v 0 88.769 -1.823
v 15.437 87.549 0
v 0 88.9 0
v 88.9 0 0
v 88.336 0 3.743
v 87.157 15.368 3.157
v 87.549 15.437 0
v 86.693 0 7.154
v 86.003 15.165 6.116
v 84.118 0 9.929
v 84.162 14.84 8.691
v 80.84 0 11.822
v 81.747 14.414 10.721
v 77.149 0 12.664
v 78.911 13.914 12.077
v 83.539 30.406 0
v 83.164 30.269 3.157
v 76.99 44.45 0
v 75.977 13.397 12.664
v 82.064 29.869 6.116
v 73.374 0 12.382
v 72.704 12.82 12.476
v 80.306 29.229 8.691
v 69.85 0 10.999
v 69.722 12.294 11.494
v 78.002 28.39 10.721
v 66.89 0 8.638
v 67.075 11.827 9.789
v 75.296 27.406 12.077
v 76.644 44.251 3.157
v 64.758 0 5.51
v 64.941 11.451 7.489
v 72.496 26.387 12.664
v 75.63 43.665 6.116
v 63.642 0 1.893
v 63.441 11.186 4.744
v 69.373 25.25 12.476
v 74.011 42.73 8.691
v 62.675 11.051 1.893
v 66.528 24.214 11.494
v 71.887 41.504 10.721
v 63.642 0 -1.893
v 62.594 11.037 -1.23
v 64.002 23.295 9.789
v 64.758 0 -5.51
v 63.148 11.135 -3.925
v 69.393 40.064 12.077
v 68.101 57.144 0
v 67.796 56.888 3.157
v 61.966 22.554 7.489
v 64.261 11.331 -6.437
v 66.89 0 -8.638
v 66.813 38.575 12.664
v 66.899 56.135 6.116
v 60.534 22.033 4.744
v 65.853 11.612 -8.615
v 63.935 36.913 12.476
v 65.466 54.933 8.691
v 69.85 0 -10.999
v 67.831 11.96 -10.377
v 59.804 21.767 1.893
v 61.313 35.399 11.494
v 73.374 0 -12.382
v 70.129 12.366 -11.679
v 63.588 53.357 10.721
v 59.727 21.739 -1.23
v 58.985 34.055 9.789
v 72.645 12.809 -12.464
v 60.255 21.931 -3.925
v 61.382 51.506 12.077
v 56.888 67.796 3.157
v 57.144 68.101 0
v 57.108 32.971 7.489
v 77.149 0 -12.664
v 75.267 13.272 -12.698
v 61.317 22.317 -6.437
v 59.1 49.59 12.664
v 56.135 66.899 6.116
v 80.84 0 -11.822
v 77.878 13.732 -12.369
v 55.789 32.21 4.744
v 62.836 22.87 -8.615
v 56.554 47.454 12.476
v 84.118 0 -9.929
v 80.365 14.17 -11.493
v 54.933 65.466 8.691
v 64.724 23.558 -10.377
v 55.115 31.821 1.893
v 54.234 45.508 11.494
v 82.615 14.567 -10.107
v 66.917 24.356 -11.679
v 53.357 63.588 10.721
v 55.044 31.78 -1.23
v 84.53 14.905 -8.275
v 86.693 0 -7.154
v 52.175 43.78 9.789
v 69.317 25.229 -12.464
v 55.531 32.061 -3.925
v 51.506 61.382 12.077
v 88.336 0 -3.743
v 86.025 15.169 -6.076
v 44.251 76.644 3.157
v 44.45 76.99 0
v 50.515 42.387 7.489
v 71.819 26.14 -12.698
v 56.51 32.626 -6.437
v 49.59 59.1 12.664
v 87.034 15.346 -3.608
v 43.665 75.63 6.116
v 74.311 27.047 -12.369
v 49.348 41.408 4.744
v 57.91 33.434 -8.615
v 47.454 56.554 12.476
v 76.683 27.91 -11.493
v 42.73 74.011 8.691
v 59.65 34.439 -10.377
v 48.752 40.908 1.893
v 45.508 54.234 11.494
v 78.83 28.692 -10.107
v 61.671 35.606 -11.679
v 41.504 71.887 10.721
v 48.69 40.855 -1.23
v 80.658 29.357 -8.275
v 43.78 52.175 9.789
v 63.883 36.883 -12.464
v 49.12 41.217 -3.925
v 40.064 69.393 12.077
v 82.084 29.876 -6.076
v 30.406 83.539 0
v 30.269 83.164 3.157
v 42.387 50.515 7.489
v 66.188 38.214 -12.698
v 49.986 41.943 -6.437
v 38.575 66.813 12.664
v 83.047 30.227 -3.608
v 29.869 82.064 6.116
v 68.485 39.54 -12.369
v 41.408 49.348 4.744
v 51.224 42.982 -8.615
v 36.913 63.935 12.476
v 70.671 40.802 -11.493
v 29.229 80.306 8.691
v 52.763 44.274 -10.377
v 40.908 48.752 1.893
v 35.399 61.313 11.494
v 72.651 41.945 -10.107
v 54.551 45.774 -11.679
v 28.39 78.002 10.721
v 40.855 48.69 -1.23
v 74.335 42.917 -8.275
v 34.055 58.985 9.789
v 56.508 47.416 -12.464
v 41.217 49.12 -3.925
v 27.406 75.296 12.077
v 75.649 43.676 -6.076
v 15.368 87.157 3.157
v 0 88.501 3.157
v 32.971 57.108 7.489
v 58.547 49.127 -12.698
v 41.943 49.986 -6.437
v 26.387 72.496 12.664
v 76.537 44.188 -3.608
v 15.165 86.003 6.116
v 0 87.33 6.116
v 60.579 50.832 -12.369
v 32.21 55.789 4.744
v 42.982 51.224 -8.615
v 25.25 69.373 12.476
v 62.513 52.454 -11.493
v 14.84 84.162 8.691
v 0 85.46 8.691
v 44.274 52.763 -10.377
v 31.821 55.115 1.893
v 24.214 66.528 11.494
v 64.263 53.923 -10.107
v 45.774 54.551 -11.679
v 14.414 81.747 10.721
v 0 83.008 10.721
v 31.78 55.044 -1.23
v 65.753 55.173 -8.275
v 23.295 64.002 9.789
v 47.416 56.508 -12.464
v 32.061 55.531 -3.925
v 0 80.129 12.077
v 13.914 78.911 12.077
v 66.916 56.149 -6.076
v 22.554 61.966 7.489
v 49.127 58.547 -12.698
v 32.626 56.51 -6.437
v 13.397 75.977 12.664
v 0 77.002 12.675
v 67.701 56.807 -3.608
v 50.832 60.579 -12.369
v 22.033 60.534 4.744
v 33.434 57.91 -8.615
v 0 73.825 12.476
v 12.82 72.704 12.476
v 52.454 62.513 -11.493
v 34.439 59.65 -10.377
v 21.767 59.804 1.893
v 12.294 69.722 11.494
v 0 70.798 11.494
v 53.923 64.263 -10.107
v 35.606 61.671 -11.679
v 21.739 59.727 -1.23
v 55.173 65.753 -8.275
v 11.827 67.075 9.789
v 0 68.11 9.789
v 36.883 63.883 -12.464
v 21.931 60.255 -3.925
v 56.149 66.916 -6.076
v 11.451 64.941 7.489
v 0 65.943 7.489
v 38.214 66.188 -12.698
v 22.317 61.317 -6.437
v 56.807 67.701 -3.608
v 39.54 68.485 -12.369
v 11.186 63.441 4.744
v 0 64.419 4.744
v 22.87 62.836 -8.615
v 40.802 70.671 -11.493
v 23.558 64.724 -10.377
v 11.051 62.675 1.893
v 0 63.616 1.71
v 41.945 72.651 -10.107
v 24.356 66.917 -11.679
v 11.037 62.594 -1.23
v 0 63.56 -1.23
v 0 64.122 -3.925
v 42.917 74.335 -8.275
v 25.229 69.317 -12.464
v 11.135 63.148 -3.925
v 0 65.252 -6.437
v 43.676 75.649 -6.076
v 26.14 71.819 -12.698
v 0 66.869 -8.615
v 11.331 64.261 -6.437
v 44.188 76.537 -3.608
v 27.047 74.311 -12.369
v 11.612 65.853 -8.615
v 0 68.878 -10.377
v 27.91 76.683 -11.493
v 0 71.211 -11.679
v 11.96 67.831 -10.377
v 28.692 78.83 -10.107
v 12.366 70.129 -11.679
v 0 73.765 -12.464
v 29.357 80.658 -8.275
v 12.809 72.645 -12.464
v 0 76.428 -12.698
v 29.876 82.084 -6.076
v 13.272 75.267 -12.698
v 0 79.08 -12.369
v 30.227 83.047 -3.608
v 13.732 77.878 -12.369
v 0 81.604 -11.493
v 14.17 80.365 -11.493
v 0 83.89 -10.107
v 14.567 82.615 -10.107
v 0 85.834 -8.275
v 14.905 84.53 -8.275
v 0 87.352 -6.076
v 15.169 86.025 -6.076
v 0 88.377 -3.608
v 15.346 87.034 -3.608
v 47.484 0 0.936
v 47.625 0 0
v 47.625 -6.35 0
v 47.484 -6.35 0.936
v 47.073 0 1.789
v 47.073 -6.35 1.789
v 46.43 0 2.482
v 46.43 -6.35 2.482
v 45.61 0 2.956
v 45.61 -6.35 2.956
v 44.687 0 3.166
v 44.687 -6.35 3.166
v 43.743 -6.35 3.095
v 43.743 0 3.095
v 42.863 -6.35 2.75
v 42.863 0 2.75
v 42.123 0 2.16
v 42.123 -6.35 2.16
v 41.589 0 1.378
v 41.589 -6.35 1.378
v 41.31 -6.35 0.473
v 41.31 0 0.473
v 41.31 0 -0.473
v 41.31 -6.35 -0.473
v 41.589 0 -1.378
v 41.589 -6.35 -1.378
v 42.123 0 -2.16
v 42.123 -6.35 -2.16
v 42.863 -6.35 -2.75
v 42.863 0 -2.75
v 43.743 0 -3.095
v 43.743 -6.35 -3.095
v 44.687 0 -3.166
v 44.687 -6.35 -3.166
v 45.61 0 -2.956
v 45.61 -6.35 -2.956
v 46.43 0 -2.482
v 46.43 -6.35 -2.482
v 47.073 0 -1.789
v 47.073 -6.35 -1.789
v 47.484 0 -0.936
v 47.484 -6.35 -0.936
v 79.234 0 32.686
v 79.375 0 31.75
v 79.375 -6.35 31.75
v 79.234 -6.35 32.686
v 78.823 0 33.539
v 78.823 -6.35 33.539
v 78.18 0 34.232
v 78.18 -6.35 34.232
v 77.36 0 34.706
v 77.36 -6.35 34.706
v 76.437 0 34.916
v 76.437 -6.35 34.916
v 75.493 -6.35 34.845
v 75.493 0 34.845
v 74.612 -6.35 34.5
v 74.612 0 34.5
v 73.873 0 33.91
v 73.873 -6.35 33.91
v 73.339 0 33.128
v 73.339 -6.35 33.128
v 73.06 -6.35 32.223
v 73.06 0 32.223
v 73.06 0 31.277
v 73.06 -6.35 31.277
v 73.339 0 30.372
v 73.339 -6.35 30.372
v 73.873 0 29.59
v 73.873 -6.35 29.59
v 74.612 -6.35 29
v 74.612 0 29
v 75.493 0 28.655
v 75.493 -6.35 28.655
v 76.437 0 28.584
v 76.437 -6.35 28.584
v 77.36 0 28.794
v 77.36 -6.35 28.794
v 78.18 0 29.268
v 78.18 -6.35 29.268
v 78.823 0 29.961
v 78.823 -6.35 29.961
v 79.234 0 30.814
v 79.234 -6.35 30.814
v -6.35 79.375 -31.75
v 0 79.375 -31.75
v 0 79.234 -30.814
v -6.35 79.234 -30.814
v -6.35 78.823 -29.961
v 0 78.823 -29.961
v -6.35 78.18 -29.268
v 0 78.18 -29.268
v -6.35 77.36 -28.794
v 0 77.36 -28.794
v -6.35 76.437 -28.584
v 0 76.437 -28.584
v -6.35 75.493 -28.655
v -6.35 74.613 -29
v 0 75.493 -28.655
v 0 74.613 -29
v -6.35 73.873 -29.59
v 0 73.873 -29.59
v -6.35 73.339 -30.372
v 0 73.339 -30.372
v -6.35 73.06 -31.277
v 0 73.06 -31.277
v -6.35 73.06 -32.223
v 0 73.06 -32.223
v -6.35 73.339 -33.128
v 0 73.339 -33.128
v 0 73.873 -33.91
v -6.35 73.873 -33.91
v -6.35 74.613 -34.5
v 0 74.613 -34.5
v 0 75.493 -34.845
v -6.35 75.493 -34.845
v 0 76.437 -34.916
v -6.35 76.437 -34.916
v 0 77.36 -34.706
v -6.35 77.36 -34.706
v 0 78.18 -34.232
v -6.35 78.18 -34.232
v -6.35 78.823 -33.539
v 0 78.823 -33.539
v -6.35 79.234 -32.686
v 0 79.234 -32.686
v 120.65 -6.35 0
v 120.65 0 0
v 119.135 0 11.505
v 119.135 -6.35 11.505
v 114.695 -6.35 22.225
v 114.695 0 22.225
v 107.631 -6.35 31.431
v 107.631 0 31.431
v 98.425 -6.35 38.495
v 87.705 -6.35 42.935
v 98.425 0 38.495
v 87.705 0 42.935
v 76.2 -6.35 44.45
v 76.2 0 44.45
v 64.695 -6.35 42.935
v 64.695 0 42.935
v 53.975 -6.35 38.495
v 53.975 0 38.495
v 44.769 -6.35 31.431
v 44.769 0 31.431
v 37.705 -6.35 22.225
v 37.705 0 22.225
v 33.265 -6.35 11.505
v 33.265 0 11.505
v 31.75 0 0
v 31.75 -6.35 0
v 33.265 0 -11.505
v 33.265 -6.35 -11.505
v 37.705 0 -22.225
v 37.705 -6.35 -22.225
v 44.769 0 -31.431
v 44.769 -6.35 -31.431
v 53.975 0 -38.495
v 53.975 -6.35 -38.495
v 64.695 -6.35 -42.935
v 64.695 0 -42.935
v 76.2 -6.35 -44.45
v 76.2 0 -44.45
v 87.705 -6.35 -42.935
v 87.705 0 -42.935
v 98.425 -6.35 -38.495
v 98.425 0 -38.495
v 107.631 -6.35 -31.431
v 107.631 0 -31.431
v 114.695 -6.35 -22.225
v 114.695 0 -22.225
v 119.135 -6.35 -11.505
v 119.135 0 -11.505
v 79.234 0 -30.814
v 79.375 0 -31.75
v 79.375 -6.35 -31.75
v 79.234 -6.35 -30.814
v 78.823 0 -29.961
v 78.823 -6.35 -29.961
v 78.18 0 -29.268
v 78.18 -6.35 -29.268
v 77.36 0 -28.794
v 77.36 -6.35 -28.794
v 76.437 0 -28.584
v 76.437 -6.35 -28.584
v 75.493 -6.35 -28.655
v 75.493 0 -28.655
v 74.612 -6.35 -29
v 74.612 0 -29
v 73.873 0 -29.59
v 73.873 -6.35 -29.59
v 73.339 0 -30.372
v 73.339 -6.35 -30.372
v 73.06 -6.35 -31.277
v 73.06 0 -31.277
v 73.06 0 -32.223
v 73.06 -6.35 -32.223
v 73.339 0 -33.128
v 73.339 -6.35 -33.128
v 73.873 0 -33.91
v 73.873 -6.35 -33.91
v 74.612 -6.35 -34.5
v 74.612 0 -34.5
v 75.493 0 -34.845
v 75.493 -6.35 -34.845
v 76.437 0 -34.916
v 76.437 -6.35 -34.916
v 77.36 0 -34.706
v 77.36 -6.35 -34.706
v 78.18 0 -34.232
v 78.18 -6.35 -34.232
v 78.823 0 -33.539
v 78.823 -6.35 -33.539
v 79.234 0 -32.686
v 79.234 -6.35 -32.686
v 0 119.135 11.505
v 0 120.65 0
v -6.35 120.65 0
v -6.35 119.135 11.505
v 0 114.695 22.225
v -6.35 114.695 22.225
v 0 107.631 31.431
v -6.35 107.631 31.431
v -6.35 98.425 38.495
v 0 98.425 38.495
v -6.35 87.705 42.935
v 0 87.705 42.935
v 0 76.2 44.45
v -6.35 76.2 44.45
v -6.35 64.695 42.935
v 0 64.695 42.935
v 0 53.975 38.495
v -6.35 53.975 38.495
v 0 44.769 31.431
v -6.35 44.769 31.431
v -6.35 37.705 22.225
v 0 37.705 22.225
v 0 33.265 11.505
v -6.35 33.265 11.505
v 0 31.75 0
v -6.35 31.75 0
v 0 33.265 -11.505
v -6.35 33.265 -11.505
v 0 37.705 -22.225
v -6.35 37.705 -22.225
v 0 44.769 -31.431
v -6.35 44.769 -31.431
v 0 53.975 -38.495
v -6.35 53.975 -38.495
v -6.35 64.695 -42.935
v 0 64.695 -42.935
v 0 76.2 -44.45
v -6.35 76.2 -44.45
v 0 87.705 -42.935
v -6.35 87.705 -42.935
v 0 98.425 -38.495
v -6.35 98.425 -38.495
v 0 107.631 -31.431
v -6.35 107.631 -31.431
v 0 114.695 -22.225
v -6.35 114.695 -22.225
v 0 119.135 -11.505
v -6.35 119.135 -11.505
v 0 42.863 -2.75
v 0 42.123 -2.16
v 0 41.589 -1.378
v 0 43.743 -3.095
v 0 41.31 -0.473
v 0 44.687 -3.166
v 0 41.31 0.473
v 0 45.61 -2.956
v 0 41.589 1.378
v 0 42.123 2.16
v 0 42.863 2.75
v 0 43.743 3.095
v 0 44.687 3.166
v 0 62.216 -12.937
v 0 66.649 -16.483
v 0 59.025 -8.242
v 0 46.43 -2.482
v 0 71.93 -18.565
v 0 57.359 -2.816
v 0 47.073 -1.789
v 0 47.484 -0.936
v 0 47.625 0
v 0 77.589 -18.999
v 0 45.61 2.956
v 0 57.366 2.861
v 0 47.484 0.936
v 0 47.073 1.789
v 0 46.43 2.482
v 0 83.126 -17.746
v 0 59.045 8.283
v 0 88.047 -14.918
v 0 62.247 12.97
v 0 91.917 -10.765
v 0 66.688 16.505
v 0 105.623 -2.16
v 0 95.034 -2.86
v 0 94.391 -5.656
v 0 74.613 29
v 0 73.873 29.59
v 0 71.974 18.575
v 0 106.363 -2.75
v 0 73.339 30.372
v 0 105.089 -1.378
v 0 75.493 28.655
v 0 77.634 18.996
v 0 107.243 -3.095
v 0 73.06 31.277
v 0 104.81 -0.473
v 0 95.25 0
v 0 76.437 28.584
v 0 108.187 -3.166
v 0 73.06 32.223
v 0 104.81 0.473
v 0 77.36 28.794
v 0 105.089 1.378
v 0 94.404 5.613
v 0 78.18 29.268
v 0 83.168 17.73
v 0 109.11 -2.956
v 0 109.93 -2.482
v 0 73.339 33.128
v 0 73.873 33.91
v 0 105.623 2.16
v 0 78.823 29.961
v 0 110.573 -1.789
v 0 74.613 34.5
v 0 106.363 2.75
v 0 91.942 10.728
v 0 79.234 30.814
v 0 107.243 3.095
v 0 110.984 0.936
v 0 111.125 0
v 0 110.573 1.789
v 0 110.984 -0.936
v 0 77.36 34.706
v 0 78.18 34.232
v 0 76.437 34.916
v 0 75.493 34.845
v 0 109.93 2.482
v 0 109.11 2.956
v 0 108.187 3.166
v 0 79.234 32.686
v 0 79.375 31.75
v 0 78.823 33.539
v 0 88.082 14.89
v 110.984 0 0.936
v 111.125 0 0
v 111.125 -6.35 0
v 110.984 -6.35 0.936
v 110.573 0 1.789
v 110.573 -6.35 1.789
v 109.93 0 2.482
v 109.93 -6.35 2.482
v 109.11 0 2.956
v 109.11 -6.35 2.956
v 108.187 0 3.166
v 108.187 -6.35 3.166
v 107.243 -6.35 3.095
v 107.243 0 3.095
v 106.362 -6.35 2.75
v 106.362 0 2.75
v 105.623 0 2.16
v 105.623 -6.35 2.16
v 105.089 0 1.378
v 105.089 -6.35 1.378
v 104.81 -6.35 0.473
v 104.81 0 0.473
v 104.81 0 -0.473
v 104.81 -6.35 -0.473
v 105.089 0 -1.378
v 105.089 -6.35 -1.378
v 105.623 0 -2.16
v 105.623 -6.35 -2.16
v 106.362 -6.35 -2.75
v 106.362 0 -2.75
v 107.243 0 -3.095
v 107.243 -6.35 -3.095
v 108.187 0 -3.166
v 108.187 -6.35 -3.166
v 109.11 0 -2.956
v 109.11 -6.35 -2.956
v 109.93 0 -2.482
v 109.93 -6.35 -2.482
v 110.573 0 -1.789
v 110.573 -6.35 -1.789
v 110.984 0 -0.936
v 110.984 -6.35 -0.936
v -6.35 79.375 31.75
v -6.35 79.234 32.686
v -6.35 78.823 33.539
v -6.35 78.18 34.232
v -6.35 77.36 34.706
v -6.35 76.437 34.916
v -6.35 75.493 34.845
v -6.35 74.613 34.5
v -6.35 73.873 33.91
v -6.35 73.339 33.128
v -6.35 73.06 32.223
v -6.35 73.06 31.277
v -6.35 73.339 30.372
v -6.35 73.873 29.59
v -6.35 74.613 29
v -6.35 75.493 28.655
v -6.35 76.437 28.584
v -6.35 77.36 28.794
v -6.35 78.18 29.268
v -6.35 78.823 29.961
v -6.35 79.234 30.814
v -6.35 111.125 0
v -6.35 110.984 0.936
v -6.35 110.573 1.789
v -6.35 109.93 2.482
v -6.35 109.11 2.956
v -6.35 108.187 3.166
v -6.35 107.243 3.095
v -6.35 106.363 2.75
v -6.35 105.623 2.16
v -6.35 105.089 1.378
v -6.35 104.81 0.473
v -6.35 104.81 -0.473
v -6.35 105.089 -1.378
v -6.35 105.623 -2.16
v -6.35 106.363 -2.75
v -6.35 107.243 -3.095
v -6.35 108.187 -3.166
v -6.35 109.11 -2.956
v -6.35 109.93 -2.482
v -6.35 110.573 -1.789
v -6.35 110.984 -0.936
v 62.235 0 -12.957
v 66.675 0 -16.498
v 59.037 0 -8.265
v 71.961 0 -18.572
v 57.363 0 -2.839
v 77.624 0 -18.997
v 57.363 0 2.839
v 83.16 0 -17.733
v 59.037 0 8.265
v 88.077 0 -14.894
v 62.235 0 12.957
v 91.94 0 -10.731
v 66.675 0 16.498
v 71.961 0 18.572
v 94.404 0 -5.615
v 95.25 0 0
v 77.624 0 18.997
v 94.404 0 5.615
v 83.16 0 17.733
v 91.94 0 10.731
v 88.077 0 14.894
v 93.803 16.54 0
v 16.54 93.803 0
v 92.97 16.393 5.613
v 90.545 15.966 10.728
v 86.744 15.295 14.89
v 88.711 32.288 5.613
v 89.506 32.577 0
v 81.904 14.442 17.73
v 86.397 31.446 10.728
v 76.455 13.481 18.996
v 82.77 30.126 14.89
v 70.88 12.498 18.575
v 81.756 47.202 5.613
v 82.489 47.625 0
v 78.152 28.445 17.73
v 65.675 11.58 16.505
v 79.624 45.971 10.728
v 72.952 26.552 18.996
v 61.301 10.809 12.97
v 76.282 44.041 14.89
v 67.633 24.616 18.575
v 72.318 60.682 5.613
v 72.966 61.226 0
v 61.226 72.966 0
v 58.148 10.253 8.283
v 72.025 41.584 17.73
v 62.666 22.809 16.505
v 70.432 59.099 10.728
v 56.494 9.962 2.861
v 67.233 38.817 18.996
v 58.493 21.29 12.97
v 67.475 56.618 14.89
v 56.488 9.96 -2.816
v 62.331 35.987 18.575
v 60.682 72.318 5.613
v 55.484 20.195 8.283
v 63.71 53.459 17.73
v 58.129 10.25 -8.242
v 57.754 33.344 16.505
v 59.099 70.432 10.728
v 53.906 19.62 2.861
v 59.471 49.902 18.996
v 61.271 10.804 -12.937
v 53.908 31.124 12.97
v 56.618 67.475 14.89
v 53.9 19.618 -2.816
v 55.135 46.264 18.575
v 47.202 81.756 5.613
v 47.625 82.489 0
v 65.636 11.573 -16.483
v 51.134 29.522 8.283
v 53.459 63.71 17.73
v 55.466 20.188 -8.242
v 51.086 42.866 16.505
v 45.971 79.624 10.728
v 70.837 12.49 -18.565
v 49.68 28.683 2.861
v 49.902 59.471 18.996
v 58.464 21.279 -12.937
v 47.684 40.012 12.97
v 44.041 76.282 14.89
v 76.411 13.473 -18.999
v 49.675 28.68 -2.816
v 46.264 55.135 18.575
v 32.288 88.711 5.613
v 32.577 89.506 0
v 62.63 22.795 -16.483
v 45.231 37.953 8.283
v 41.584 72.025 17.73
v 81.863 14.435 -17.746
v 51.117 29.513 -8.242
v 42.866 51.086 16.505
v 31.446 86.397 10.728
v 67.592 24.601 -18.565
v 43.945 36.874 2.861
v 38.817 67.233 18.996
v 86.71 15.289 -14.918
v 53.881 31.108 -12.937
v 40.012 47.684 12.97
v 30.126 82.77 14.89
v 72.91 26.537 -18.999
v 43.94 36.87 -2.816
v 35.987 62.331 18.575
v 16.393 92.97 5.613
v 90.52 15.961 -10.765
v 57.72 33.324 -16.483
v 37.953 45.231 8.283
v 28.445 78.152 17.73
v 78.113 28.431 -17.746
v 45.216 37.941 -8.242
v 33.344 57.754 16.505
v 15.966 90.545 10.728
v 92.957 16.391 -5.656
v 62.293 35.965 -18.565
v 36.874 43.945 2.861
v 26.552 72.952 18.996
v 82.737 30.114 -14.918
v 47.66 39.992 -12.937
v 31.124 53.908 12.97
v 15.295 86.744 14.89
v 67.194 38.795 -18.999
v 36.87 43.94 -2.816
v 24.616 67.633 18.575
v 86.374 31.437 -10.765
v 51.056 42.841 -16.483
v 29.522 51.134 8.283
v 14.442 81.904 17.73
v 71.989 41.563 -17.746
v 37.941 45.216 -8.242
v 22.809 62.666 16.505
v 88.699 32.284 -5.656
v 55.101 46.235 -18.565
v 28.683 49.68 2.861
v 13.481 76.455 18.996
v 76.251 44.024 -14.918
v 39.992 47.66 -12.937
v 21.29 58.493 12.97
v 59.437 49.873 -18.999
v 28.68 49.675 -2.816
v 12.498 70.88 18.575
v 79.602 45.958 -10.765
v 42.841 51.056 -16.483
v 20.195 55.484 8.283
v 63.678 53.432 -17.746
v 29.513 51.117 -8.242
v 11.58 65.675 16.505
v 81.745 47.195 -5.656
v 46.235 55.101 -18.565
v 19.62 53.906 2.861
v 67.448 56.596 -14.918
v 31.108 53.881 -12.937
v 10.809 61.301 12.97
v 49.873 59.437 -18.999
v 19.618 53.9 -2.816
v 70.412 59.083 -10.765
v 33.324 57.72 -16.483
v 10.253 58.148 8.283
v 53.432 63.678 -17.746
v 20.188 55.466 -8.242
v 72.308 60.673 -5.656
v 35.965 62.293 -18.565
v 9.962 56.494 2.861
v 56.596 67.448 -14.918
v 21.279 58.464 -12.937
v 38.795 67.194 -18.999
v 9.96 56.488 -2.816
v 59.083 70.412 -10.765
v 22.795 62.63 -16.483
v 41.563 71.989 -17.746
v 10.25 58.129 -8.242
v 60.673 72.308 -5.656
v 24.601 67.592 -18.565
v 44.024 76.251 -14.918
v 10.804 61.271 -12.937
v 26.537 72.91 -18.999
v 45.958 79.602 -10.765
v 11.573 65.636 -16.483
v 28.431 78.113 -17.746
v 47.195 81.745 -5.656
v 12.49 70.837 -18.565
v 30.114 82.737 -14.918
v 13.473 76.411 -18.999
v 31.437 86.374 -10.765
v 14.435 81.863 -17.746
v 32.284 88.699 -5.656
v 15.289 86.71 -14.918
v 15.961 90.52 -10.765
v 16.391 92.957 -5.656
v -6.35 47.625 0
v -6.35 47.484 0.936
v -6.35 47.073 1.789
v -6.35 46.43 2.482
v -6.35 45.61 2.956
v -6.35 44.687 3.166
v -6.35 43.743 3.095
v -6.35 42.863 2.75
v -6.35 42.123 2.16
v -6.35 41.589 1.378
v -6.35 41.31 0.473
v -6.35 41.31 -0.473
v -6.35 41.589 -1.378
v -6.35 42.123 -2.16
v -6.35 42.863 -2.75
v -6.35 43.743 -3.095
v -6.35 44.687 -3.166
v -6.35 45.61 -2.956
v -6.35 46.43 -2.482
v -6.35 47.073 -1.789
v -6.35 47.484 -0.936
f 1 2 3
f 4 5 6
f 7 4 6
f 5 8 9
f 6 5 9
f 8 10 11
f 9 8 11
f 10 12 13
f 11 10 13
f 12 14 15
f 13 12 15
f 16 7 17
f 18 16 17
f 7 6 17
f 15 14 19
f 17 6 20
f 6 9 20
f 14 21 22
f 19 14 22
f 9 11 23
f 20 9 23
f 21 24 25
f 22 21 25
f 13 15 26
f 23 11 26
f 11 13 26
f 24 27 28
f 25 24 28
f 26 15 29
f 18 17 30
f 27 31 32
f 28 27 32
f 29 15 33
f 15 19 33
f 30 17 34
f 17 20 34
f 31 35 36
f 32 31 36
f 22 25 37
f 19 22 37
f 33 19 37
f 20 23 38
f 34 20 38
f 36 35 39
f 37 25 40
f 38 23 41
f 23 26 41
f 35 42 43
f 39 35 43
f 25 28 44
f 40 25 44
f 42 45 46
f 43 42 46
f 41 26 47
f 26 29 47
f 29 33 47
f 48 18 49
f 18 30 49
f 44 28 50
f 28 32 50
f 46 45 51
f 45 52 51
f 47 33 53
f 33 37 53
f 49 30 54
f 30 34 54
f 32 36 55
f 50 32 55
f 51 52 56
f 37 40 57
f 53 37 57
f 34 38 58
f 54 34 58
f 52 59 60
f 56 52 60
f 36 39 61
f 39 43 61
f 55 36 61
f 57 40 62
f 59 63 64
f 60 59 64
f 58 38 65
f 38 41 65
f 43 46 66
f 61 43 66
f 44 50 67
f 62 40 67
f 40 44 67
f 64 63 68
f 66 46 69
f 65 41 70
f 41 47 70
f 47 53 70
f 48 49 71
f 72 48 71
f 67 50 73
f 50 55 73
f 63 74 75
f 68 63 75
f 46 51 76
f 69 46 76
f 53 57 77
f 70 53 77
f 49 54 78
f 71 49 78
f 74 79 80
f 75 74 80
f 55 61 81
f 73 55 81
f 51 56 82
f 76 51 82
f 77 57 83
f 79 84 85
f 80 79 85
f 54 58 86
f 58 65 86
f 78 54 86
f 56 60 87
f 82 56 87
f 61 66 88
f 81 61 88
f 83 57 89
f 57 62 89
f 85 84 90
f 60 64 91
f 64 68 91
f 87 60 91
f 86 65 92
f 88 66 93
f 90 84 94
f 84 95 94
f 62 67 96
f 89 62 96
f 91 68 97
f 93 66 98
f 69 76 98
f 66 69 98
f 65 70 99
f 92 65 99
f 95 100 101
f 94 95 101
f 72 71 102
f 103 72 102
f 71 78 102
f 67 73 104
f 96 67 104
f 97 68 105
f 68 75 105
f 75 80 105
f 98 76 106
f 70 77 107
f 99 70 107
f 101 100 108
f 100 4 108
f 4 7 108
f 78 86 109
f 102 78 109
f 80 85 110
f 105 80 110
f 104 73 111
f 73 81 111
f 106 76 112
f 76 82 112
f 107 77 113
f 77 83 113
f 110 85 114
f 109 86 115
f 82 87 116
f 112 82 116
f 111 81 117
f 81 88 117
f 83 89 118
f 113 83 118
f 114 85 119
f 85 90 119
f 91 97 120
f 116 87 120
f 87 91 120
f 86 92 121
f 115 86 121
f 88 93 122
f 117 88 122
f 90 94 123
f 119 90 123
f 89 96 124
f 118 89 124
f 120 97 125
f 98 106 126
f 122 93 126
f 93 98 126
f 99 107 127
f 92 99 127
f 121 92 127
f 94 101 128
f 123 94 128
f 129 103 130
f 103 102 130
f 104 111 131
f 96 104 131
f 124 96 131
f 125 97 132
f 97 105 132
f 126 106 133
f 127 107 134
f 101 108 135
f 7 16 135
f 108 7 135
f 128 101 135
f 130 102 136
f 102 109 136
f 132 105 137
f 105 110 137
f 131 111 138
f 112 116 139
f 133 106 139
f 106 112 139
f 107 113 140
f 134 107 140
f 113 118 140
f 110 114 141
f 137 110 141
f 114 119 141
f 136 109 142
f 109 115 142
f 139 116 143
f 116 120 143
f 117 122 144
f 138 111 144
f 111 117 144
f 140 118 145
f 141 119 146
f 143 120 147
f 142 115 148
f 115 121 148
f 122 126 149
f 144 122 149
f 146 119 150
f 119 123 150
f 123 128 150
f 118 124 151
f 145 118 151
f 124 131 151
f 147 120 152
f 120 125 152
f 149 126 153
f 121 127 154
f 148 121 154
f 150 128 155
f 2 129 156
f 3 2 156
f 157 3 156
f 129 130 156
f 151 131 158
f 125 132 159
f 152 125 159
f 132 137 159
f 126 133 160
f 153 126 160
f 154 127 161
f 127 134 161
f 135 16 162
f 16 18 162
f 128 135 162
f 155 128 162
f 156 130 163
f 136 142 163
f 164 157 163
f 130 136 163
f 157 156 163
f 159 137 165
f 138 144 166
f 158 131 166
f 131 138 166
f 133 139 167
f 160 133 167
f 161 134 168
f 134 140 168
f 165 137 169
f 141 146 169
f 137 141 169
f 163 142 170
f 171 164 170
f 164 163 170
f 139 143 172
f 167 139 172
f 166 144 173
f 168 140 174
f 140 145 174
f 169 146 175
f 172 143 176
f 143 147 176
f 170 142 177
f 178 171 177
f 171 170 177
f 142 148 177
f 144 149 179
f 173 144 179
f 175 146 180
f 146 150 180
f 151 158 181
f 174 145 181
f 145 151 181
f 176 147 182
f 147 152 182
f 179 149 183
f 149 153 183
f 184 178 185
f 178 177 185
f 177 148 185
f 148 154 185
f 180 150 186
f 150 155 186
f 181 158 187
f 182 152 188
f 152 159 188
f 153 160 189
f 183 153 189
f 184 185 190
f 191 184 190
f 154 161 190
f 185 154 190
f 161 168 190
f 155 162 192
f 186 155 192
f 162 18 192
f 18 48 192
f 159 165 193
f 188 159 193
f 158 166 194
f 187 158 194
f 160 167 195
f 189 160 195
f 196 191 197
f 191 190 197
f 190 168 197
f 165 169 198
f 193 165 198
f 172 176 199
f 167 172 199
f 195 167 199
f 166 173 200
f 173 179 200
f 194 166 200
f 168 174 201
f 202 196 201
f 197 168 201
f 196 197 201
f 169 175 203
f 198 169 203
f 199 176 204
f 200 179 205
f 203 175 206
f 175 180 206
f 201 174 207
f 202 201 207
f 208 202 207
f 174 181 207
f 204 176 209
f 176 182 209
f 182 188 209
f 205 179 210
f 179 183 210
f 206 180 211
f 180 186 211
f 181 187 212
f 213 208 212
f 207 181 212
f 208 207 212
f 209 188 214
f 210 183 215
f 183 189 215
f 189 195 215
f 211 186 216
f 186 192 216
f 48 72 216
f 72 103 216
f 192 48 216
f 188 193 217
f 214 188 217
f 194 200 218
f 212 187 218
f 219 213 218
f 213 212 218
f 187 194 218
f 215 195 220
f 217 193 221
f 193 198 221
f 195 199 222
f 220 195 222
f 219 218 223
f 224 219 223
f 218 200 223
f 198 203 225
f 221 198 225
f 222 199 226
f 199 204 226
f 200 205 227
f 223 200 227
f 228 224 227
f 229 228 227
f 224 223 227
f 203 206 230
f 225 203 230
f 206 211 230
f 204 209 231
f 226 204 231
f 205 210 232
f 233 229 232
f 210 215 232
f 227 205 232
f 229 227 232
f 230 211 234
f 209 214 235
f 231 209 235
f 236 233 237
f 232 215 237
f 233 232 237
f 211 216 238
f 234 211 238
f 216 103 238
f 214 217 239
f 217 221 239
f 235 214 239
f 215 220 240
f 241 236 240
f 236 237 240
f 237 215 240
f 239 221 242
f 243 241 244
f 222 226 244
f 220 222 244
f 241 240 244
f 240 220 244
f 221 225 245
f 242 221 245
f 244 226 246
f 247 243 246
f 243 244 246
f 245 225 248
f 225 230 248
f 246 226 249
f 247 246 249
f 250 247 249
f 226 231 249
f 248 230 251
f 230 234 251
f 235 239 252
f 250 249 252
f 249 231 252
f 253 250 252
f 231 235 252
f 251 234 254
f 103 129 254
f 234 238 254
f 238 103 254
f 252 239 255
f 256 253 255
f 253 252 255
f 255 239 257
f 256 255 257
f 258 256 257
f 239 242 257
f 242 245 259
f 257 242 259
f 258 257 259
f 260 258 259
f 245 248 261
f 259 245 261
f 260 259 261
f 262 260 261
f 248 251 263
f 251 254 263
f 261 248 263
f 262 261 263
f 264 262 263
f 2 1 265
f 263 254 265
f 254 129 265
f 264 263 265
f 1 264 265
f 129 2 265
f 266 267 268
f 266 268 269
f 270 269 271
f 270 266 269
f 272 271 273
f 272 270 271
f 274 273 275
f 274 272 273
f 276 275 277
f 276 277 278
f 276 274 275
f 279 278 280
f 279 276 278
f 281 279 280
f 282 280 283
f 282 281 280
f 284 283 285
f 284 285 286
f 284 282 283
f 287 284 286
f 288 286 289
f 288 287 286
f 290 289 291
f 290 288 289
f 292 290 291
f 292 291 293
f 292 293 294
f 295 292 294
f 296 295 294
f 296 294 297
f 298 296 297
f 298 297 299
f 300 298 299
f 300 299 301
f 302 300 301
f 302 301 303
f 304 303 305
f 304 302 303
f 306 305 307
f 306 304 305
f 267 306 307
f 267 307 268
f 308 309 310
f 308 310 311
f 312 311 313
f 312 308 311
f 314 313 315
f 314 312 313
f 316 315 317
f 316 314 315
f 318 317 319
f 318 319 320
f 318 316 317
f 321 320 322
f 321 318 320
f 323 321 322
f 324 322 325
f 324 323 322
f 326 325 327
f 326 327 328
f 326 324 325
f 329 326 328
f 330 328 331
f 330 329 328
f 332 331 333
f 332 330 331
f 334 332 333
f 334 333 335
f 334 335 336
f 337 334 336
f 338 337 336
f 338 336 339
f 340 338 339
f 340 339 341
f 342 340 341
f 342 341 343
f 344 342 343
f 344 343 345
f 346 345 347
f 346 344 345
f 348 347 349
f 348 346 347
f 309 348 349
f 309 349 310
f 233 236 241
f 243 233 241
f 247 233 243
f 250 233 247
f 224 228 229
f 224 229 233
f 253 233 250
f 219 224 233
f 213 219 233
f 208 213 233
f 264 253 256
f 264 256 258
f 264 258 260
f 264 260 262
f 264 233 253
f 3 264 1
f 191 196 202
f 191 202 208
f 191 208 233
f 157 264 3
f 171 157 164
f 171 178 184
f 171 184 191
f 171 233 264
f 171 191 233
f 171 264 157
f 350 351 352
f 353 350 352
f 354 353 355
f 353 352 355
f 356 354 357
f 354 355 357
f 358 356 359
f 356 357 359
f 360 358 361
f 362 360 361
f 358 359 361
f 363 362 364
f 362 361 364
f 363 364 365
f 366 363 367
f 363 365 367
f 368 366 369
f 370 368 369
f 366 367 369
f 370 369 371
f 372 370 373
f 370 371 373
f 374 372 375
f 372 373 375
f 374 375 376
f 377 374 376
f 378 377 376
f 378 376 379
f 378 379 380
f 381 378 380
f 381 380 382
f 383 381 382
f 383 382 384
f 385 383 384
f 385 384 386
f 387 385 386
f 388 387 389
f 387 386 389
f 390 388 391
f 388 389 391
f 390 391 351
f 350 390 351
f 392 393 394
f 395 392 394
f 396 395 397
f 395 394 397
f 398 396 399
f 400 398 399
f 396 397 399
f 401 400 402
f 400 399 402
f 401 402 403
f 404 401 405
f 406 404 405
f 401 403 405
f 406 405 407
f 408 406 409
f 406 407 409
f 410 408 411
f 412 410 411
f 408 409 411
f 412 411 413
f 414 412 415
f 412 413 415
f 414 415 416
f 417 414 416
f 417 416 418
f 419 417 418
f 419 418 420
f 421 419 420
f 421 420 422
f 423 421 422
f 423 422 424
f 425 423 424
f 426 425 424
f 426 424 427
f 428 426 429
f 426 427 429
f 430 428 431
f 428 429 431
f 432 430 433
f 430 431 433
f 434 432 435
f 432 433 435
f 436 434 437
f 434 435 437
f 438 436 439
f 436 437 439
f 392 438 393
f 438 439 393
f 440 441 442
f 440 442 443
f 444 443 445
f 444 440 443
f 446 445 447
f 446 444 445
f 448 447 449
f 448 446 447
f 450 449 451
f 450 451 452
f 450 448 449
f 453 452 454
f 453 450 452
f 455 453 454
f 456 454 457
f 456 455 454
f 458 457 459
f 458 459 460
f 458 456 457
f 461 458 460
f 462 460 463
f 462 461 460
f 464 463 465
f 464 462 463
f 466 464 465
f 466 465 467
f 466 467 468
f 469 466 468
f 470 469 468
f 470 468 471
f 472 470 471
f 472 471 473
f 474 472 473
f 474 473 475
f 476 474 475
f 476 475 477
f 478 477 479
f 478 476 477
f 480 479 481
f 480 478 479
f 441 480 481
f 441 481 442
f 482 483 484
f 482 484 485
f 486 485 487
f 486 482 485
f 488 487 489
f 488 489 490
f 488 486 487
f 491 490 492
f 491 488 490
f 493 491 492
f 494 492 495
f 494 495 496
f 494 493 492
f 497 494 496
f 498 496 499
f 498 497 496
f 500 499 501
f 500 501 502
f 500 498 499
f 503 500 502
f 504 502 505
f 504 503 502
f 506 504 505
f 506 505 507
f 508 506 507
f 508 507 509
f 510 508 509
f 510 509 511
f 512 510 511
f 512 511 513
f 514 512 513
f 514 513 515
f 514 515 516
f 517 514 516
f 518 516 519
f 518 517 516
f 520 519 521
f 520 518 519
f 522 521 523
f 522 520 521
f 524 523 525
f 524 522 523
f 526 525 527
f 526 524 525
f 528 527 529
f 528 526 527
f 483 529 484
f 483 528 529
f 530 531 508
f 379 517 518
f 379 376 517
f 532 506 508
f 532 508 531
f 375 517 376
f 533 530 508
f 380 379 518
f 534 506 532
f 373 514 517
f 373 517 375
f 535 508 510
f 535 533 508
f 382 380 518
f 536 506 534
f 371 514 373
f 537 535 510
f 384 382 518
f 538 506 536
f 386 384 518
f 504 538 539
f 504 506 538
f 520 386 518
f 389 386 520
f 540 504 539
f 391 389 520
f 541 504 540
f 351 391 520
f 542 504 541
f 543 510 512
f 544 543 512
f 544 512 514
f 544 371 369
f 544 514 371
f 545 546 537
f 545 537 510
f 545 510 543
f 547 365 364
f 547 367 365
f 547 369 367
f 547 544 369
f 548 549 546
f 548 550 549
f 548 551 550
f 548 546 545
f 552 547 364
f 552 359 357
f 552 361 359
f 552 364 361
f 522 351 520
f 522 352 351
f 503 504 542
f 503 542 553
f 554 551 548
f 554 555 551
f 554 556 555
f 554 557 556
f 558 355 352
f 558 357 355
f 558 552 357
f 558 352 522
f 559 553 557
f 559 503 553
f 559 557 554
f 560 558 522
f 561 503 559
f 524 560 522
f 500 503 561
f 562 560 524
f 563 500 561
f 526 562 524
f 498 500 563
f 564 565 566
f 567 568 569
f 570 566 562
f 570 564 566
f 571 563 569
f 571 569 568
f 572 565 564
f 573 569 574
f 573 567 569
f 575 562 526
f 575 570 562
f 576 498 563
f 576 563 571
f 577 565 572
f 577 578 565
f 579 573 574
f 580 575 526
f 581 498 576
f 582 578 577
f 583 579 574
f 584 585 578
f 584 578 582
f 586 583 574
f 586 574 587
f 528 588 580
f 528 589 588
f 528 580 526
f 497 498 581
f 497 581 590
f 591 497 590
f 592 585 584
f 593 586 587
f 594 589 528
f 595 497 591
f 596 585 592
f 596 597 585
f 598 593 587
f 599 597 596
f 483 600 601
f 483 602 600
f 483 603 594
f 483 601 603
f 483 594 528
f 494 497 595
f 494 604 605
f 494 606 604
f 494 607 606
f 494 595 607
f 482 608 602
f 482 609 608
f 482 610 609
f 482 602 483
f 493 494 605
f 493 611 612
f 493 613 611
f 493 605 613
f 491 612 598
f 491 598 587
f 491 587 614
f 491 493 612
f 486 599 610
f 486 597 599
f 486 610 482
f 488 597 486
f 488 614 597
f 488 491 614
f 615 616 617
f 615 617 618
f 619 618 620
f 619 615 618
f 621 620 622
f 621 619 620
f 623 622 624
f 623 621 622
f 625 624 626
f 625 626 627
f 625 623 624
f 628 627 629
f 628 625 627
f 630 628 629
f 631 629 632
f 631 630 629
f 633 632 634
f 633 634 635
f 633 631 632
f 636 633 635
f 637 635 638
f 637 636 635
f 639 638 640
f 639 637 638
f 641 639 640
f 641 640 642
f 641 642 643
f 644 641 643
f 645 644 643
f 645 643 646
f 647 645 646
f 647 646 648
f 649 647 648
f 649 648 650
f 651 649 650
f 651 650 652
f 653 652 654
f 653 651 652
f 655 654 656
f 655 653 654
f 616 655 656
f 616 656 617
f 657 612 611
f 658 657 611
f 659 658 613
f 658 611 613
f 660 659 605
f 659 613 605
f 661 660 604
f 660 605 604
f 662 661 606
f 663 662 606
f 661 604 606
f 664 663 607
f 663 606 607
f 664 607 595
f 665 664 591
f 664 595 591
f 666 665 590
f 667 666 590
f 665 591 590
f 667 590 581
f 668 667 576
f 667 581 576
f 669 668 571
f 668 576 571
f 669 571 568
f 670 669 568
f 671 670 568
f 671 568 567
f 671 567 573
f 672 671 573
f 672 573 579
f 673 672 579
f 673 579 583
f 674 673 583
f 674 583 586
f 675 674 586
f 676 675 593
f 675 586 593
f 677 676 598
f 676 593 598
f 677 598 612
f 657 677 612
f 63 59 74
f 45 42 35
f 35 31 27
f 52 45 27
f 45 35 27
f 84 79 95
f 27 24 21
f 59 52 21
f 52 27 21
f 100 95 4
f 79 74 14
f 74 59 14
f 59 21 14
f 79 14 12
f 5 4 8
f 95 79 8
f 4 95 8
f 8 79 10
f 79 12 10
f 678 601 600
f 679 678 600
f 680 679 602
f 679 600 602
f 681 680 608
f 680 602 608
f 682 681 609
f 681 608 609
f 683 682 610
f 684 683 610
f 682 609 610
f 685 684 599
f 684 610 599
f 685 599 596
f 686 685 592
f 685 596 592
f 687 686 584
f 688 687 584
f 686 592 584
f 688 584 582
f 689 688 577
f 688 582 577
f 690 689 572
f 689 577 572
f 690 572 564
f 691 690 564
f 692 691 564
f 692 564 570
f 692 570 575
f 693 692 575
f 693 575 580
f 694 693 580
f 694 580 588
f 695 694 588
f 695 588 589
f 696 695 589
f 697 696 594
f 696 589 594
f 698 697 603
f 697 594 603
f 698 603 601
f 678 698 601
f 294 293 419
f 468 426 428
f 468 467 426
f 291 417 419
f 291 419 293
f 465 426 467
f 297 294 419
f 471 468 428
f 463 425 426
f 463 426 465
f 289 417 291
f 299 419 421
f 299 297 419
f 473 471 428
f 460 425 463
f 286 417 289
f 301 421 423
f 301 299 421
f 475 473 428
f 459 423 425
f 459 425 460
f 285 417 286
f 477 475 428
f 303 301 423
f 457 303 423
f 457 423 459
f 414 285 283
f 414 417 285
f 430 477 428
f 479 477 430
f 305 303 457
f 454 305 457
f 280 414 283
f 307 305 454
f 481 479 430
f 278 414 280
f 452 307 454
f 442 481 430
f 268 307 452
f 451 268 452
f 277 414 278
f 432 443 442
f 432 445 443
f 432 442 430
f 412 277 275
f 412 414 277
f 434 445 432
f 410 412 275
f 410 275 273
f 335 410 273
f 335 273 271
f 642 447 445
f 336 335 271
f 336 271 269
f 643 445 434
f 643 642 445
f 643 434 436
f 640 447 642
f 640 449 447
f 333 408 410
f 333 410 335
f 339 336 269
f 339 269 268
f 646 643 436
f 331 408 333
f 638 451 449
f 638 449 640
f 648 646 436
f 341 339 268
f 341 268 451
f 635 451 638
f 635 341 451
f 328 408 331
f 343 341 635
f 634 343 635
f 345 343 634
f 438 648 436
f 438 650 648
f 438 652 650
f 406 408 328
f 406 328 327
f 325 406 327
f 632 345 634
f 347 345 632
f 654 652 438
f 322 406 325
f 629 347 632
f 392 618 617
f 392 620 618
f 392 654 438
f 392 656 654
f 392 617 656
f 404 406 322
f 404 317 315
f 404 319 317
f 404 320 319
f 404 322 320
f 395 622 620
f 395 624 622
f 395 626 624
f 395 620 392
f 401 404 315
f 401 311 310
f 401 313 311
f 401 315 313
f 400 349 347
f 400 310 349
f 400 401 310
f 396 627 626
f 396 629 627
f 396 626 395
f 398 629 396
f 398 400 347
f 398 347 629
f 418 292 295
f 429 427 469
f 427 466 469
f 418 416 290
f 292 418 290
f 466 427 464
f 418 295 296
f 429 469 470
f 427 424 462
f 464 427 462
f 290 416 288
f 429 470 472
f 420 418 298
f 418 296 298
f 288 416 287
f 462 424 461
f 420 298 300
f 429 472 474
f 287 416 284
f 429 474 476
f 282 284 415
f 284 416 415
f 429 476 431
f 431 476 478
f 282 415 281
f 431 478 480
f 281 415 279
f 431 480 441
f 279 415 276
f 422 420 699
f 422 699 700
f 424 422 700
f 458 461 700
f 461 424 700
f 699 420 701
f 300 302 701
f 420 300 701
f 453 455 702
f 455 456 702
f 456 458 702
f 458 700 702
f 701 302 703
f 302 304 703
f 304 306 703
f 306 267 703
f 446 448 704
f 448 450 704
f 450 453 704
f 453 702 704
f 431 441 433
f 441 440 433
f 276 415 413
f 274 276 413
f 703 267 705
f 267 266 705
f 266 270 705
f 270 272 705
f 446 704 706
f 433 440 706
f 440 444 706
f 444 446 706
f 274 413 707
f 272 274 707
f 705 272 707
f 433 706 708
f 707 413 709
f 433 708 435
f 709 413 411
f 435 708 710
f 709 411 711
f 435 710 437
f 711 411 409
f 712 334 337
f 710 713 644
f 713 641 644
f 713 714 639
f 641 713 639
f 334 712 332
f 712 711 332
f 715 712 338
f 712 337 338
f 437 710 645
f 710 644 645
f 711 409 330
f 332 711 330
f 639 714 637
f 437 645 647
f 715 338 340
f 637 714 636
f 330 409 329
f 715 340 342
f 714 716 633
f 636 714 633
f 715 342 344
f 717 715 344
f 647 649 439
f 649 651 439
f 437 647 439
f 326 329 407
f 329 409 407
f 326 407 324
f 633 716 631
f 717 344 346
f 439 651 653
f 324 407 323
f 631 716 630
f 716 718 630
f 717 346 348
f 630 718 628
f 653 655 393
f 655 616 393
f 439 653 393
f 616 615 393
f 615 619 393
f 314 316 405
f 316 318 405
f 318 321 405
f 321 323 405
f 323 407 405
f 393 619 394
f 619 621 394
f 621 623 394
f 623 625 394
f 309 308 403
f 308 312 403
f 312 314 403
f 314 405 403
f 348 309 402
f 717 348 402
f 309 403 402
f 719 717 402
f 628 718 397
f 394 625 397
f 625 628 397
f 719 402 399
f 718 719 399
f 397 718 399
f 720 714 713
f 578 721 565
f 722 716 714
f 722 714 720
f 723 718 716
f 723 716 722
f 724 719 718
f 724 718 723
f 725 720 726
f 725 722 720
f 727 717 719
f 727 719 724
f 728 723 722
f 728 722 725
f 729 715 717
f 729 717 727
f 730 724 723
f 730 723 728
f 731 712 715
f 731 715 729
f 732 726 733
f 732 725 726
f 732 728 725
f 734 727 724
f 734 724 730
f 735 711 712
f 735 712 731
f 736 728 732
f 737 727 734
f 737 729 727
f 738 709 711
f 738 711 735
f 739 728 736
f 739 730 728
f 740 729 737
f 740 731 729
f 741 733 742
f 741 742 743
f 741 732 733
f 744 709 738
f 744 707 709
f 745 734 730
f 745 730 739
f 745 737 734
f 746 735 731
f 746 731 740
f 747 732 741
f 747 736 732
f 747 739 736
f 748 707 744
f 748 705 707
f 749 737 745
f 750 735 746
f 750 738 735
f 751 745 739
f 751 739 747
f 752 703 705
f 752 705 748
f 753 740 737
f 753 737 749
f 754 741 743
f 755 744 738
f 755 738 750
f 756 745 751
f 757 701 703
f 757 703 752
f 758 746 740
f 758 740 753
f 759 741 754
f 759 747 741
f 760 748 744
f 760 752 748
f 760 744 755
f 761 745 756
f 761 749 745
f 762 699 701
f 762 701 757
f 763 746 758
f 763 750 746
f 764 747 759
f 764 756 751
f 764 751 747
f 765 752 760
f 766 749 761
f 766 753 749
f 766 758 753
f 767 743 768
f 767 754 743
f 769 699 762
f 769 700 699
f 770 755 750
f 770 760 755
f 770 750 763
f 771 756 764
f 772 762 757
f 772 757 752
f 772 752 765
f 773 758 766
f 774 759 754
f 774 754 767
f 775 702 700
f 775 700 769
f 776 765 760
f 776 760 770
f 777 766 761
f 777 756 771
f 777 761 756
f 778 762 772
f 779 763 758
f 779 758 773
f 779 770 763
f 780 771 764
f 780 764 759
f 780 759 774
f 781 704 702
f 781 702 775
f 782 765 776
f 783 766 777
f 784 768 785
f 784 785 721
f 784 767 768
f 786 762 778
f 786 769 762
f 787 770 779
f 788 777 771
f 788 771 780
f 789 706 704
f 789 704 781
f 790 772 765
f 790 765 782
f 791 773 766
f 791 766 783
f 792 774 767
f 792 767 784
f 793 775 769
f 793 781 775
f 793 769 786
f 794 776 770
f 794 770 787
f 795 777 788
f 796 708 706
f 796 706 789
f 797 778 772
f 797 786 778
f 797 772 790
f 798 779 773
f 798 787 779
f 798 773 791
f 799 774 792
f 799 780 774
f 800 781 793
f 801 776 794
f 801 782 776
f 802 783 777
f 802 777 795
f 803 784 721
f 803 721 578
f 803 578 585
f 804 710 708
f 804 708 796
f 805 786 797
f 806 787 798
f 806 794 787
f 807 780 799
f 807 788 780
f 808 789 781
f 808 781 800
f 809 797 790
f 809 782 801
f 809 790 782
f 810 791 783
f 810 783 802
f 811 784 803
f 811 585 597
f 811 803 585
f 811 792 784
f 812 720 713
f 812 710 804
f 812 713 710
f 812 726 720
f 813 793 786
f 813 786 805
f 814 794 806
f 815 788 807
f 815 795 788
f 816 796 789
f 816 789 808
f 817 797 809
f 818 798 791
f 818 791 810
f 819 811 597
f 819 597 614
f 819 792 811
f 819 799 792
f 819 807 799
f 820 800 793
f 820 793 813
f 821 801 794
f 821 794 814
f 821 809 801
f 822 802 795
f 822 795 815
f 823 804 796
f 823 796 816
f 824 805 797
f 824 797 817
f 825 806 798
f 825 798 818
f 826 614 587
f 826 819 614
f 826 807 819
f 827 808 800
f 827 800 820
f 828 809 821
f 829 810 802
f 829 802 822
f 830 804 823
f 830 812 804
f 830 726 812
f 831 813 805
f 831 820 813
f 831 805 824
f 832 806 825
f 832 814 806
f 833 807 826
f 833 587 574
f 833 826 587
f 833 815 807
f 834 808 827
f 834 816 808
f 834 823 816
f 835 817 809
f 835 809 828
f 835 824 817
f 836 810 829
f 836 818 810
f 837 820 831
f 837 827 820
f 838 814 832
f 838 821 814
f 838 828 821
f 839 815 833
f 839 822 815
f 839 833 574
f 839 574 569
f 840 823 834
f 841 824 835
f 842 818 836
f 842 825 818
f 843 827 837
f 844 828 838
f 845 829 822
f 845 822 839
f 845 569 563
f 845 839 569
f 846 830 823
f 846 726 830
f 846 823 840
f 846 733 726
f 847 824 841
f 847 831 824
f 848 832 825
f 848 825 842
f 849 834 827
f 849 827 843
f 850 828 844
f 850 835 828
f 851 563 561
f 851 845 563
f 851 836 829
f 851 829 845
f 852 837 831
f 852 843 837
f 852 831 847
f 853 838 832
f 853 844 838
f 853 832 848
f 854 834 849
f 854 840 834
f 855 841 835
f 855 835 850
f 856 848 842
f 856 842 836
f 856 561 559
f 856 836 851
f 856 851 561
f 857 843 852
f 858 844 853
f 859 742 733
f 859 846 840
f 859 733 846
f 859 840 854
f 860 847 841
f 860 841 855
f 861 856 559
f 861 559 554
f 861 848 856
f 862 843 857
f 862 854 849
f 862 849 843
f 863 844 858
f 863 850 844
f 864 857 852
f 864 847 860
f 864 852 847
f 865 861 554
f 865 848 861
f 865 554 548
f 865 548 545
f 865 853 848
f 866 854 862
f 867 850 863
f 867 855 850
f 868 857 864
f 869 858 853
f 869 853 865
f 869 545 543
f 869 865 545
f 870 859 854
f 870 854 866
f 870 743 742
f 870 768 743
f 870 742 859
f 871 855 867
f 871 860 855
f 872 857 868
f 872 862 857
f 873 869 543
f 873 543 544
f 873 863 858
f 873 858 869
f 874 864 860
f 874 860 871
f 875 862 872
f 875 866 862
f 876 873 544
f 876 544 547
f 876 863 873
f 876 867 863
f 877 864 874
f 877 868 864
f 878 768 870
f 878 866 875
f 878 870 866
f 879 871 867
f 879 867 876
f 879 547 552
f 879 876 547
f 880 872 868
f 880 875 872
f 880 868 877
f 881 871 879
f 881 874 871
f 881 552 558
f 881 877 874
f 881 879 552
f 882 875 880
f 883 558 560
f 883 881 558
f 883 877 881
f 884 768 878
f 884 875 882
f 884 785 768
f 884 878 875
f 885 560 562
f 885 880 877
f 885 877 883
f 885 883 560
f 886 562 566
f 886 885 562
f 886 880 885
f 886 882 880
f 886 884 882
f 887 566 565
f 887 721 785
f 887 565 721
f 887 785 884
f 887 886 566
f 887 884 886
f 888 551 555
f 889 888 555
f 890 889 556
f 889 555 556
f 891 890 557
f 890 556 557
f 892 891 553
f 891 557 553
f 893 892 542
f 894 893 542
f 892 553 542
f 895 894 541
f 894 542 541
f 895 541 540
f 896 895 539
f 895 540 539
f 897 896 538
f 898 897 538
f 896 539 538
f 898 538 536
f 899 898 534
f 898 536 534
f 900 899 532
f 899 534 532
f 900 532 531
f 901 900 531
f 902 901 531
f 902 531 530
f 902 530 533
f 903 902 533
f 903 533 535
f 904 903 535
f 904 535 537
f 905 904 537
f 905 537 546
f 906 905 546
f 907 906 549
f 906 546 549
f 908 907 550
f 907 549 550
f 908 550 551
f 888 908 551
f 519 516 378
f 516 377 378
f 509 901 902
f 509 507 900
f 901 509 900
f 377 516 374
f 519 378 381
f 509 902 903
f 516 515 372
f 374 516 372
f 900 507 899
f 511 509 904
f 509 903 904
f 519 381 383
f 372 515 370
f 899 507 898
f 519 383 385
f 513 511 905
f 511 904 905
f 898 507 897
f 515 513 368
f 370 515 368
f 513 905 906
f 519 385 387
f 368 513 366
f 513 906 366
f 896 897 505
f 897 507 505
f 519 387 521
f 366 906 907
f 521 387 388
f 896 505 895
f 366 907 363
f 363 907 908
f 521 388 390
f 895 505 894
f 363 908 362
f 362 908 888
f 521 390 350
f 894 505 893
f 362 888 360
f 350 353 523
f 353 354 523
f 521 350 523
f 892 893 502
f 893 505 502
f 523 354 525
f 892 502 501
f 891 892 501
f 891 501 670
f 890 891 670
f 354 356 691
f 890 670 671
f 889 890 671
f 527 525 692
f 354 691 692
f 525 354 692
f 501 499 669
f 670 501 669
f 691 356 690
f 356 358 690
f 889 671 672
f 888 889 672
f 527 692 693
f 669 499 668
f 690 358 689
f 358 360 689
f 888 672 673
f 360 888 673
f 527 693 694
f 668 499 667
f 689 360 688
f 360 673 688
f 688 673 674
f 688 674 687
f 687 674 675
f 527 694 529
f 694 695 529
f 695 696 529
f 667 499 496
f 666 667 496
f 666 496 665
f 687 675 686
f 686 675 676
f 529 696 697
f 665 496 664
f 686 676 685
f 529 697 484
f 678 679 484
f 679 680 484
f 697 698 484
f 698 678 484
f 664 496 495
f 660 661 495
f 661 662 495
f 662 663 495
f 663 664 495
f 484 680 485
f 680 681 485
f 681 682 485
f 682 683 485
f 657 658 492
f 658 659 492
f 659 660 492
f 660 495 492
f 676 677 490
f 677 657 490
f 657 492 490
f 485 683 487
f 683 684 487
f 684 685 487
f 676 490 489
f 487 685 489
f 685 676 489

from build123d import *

# Parameters (mm, degrees)
SKETCH3_R           = 19.05
SKETCH3_R_2         = 12.7
SKETCH4_R           = 44.45
SKETCH4_R_2         = 3.175
BOSS_EXTRUDE1_DEPTH = 6.35


with BuildPart() as part:
    # Sweep1: sweep along a path in Sketch1
    with BuildLine(Plane.XY) as sweep1_path:
        ThreePointArc((76.2, 0), (52.411249779, 55.31275528), (-4.101860805, 76.089517924))
    # Sketch3 → Sweep1 (sweep)
    with BuildSketch(Plane(origin=(0, 0, 0), x_dir=(1, 0, 0), z_dir=(0, 1, 0))):
        with Locations((76.2, 0)):
            Circle(SKETCH3_R)
        with Locations((76.2, 0)):
            Circle(SKETCH3_R_2, mode=Mode.SUBTRACT)
    sweep(path=sweep1_path.line)

    # Sketch4 → Boss-Extrude1 (add)
    with BuildSketch(Plane.XZ):
        with Locations((76.2, 0)):
            Circle(SKETCH4_R)
        with Locations((76.2, 31.75)):
            Circle(SKETCH4_R_2, mode=Mode.SUBTRACT)
        with Locations((107.95, 0)):
            Circle(SKETCH4_R_2, mode=Mode.SUBTRACT)
        with Locations((76.2, -31.75)):
            Circle(SKETCH4_R_2, mode=Mode.SUBTRACT)
        with Locations((44.45, 0)):
            Circle(SKETCH4_R_2, mode=Mode.SUBTRACT)
    boss_extrude1 = extrude(amount=BOSS_EXTRUDE1_DEPTH)

    # Mirror1: Boss-Extrude1 across plane
    add(boss_extrude1.mirror(Plane(origin=(0, 0, 0), x_dir=(0, 0, 1), z_dir=(-0.7071067811865488, 0.7071067811865464, 0))))


solid = part.part
